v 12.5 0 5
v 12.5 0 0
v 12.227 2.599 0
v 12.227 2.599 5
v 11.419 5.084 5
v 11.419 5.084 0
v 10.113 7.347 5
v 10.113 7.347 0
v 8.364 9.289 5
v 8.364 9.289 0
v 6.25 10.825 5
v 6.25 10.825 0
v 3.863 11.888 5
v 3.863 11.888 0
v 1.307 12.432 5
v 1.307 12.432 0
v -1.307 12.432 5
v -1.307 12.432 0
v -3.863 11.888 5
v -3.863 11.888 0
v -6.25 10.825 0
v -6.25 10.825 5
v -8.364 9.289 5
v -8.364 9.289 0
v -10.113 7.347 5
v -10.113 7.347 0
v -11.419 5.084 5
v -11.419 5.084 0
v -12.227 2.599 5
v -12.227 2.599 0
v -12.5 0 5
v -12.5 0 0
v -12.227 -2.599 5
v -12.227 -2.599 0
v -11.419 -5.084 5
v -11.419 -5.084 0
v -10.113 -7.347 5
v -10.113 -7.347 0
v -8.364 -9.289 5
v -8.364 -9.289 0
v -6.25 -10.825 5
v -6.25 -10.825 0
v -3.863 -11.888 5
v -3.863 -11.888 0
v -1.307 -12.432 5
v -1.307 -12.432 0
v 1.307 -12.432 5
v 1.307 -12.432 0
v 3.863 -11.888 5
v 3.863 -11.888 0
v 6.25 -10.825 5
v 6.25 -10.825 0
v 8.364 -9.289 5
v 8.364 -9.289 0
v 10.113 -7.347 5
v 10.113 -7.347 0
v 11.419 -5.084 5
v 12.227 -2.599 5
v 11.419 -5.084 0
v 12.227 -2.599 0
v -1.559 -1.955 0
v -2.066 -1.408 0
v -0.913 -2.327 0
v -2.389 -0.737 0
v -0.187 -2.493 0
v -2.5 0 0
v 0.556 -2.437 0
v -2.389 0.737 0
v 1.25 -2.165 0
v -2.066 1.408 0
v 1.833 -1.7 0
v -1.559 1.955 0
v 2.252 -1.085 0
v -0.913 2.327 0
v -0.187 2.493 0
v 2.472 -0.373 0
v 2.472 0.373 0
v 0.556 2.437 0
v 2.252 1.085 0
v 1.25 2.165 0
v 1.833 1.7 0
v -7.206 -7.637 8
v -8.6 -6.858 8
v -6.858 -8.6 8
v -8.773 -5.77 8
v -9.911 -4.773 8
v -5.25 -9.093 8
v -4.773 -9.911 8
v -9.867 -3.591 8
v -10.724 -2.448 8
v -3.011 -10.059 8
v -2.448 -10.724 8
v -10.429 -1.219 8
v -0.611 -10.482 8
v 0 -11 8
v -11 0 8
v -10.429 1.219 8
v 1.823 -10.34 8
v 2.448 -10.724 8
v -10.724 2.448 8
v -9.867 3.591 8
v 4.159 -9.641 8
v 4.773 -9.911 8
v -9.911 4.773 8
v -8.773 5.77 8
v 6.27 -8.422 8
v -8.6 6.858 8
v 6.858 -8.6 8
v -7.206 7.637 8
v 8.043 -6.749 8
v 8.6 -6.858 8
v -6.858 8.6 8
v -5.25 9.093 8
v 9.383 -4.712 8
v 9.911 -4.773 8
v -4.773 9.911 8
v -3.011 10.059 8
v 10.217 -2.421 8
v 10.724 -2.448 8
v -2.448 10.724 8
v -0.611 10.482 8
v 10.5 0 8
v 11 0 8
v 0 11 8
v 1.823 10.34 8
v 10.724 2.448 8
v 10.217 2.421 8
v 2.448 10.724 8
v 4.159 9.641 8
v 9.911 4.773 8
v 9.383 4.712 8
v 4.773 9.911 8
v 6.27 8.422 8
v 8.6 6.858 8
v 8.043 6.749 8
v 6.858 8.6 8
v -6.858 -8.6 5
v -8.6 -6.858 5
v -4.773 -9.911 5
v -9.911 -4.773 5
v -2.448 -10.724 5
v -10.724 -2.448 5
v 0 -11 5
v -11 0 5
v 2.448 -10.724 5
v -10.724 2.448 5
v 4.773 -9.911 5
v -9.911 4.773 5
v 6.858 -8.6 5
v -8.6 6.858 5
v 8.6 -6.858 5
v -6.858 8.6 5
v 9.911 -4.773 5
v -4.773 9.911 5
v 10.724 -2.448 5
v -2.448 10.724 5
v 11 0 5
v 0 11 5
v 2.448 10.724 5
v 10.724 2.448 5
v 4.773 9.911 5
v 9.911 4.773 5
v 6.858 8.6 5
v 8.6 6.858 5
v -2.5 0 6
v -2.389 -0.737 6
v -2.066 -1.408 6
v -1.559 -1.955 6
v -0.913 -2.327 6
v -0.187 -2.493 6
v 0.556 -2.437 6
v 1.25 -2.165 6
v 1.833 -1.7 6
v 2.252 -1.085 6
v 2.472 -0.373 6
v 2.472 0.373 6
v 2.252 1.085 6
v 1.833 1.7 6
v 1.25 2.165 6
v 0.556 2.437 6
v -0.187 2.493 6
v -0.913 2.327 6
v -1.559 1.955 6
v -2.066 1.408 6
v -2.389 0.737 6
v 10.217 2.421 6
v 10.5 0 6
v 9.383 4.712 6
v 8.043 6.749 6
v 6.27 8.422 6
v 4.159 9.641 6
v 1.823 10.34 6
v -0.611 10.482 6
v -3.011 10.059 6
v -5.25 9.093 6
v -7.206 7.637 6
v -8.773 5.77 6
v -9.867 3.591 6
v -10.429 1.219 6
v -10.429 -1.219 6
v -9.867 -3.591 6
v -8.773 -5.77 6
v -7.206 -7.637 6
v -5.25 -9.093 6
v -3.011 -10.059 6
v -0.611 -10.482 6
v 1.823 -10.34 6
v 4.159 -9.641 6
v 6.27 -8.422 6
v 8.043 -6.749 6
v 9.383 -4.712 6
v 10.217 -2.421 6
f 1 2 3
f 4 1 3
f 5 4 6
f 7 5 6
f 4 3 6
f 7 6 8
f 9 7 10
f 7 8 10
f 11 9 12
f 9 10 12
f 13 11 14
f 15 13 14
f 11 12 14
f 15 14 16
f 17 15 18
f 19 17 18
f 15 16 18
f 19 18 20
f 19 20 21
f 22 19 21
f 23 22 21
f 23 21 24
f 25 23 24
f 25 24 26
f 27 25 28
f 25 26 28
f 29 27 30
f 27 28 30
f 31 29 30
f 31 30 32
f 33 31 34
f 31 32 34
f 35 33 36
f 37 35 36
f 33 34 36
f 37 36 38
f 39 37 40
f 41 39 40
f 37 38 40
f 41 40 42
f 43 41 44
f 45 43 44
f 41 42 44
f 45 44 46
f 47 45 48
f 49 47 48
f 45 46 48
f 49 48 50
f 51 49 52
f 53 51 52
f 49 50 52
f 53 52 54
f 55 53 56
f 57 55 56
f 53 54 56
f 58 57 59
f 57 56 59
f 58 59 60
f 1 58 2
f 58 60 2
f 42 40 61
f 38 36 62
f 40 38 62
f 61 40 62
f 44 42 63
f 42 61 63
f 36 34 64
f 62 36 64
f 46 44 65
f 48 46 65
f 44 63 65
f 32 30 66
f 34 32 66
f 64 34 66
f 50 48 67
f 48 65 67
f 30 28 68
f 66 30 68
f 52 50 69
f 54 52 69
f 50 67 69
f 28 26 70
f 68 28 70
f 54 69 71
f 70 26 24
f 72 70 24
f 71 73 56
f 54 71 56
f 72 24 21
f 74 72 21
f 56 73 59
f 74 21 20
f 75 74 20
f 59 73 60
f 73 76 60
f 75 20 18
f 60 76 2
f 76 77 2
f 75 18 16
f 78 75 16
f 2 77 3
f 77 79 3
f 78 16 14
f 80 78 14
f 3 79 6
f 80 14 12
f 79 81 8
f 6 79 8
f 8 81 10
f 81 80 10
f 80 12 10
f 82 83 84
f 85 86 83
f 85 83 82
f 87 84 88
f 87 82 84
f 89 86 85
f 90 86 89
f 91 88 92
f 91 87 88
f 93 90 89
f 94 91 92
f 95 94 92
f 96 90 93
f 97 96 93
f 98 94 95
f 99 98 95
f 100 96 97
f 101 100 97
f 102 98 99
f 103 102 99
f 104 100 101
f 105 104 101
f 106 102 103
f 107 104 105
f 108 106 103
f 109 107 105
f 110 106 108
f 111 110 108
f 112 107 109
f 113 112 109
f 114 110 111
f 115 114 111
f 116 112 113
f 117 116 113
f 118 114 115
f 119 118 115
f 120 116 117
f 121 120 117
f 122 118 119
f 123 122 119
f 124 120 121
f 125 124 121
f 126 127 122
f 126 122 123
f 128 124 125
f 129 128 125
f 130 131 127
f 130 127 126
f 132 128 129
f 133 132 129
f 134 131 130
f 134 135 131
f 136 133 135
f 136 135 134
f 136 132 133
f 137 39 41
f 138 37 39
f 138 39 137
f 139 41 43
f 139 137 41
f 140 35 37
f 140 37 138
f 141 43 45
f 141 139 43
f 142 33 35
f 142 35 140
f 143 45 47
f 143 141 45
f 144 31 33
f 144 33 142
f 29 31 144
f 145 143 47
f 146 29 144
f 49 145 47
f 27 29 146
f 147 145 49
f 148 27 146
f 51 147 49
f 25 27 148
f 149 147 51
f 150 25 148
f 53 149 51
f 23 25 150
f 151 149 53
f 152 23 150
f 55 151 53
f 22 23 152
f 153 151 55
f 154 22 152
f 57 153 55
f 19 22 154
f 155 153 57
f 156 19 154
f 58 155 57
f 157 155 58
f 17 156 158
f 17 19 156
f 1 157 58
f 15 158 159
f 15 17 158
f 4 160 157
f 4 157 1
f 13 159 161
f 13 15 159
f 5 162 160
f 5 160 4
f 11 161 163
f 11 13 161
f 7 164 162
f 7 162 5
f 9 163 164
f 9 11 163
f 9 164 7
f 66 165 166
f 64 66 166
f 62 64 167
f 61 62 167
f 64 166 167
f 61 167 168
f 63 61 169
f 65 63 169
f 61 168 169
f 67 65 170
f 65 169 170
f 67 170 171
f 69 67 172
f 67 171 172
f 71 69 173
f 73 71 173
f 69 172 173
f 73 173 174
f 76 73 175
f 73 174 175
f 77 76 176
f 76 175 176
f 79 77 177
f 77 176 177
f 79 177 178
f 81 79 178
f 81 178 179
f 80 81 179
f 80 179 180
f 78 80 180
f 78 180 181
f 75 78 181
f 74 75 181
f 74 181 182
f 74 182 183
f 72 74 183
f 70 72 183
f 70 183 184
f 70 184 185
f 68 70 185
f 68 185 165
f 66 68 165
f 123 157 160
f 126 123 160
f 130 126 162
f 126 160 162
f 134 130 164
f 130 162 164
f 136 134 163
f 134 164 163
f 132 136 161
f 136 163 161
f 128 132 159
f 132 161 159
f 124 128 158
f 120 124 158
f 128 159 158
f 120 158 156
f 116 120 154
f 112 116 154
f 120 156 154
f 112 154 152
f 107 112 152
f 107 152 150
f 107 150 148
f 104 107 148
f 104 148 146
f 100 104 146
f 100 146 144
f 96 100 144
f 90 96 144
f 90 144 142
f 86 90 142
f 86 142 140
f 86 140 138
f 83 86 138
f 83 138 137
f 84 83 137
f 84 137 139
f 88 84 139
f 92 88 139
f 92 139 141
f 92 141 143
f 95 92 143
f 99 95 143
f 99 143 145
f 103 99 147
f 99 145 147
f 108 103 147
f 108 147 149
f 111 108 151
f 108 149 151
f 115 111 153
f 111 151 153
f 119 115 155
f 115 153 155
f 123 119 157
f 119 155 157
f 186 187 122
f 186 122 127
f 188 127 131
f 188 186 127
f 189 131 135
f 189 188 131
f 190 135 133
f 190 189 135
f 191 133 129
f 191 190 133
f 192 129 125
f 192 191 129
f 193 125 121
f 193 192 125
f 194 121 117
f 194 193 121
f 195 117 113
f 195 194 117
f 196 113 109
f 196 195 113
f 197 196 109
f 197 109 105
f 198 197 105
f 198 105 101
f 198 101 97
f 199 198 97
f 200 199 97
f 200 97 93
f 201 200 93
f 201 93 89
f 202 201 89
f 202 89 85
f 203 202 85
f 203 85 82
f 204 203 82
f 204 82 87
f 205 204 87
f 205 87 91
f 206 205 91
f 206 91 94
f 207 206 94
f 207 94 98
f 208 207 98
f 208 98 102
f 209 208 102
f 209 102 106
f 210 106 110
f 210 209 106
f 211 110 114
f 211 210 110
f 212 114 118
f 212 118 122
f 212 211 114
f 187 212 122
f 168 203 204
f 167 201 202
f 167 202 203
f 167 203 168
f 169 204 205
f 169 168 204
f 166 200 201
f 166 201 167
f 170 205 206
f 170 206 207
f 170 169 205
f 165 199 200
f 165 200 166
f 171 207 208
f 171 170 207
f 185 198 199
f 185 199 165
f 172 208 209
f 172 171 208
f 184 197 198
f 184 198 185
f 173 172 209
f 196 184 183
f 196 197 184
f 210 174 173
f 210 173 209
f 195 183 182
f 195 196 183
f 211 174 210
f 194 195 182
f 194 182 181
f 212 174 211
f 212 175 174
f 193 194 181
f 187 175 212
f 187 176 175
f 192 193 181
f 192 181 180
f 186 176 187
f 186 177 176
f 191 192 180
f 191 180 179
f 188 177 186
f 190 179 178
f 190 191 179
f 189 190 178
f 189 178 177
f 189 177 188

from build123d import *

# Parameters (mm, degrees)
F0_R     = 12.5
F0_R_2   = 11
F1_DEPTH = 5
F0_R_3   = 10.5
F2_DEPTH = 8
F3_DEPTH = 6
F4_D     = 5


with BuildPart() as f1:
    # F0 (on Top) → F1 (new body)
    with BuildSketch(Plane.XY):
        Circle(F0_R)
        Circle(F0_R_2, mode=Mode.SUBTRACT)
    extrude(amount=F1_DEPTH)

    # F0 (on Top) → F2 (join)
    with BuildSketch(Plane.XY):
        Circle(F0_R_2)
        Circle(F0_R_3, mode=Mode.SUBTRACT)
    extrude(amount=F2_DEPTH)

    # F0 (on Top) → F3 (join)
    with BuildSketch(Plane.XY):
        Circle(F0_R_3)
    extrude(amount=F3_DEPTH)

    # F4 (through all)
    with Locations(Plane(origin=(0, 0, 0), x_dir=(1, 0, 0), z_dir=(0, 0, -1))):
        with Locations((0, 0)):
            Hole(F4_D / 2)


solid = f1.part
